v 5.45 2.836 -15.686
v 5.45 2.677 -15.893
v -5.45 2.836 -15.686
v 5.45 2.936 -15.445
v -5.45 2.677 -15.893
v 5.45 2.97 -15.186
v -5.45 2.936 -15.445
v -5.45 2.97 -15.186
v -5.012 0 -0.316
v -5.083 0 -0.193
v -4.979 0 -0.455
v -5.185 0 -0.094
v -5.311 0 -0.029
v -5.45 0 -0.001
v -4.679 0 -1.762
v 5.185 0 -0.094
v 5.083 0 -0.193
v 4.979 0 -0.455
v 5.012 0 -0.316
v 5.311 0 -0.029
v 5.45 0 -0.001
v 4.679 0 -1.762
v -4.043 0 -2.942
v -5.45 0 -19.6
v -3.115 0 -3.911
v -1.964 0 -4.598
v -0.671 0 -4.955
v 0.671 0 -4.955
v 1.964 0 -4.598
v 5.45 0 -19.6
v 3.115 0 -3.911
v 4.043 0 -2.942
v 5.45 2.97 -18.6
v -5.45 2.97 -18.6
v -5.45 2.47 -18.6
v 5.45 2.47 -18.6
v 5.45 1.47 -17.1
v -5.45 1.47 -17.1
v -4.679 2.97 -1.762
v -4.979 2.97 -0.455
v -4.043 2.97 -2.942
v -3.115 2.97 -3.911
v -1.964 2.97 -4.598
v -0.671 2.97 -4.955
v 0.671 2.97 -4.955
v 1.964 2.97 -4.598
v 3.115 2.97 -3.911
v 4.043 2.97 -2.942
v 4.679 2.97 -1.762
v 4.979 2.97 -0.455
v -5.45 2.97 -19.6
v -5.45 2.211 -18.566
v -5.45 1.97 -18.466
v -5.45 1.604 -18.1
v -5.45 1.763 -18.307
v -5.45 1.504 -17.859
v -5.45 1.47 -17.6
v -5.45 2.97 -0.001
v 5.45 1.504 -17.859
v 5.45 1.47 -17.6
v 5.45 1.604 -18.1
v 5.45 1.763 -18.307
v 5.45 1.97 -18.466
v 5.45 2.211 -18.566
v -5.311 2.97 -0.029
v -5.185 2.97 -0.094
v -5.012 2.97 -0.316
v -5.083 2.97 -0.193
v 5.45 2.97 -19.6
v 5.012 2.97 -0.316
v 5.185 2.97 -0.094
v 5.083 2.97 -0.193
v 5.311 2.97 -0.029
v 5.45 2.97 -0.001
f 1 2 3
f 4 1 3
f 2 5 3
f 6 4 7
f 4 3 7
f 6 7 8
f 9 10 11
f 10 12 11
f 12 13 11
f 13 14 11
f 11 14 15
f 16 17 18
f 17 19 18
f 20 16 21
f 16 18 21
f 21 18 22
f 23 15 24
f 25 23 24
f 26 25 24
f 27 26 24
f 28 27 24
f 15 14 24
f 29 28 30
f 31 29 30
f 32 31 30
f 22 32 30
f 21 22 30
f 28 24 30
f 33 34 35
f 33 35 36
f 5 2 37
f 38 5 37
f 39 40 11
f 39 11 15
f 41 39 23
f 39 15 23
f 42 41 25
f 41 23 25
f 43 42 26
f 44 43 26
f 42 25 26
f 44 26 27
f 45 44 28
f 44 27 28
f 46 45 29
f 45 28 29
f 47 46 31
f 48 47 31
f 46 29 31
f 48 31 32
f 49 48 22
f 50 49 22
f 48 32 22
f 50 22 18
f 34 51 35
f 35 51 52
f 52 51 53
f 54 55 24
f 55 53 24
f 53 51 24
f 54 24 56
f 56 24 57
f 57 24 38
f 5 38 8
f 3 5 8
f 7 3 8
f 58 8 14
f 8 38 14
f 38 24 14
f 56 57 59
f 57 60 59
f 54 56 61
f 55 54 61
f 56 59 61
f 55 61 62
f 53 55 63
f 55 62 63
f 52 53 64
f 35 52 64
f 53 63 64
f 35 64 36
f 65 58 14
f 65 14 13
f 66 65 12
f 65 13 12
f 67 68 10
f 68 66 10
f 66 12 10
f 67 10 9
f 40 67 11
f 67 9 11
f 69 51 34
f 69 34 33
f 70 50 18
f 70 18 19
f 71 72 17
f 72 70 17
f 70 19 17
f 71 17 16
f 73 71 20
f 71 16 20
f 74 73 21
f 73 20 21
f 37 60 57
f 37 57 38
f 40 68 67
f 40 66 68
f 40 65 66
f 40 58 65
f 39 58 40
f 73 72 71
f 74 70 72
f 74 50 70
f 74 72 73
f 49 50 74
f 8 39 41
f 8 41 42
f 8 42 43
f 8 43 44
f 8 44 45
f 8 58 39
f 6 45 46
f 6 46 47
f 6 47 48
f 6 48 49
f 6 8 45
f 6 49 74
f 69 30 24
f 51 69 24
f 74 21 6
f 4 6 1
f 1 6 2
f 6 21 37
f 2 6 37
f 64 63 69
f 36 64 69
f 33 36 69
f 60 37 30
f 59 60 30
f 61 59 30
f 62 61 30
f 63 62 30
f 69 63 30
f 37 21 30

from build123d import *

# Parameters (mm, degrees)
BOSS_EXTRUDE1_DEPTH = 2.97
FILLET1_R           = 0.5
SKETCH2_W           = 10.9
SKETCH2_H           = 1
CUT_EXTRUDE1_DEPTH  = 1.5
CHAMFER1_SIZE       = 2
FILLET2_R           = 1


with BuildPart() as part:
    # Sketch1 → Boss-Extrude1 (new body)
    with BuildSketch(Plane(origin=(0, 0, 0), x_dir=(1, 0, 0), z_dir=(0, 1, 0))):
        with BuildLine():
            Line((5, 0), (5.45, 0))
            Line((5.45, 0), (5.45, 19.6))
            Line((5.45, 19.6), (-5.45, 19.6))
            Line((-5.45, 19.6), (-5.45, 0))
            Line((-5.45, 0), (-5, 0))
            ThreePointArc((-5, 0), (0, 5), (5, 0))
        make_face()
    extrude(amount=BOSS_EXTRUDE1_DEPTH)

    # Fillet1
    # the kernel refuses this fillet: 0.5 mm, written as the material it takes off along each edge
    with BuildSketch(Plane(origin=(5, -1.193063938, 0), x_dir=(1, 0, 0), z_dir=(0, 1, 0))) as fillet1_piece_1:
        with BuildLine():
            CenterArc((0.477225575, 0.5), FILLET1_R, 185.21590857, 84.78409143)
            ThreePointArc((-0.020704023, 0.454545455), (-0.005178688, 0.227508366), (0, 0))
            Line((0, 0), (0.477225575, 0))
        make_face()
    extrude(amount=5.356127875, mode=Mode.SUBTRACT)
    with BuildSketch(Plane(origin=(-5, -1.193063938, 0), x_dir=(-1, 0, 0), z_dir=(0, 1, 0))) as fillet1_piece_2:
        with BuildLine():
            CenterArc((0.477225575, -0.5), FILLET1_R, 90, 84.78409143)
            ThreePointArc((-0.020704023, -0.454545455), (-0.005178688, -0.227508366), (0, 0))
            Line((0, 0), (0.477225575, 0))
        make_face()
    extrude(amount=5.356127875, mode=Mode.SUBTRACT)

    # Sketch2 → Cut-Extrude1 (cut)
    with BuildSketch(Plane(origin=(0, 2.97, 0), x_dir=(1, 0, 0), z_dir=(0, 1, 0))):
        with Locations((0, 18.1)):
            Rectangle(SKETCH2_W, SKETCH2_H)
    extrude(amount=-CUT_EXTRUDE1_DEPTH, mode=Mode.SUBTRACT)

    # Chamfer1
    # the kernel refuses this chamfer: 2 mm, written as the material it takes off along each edge
    with BuildSketch(Plane(origin=(10.593365976, 2.97, -17.6), x_dir=(0, 0.02749587661058627, 0.9996219169112968), z_dir=(-1, 0, 0))) as chamfer1_piece_1_section:
        Polygon((CHAMFER1_SIZE * 0.999621916911, -CHAMFER1_SIZE * 0.0274958766106), (-CHAMFER1_SIZE * 0.0274958766106, -CHAMFER1_SIZE * 0.999621916911), (0, 0), align=None)
    chamfer1_piece_1 = extrude(amount=21.186731952, mode=Mode.PRIVATE)
    chamfer1_piece_1 = split(chamfer1_piece_1, bisect_by=Plane(origin=(0, 1.47, -16.89608178), z_dir=(0, 1, 0)), keep=Keep.TOP, mode=Mode.PRIVATE)
    add(chamfer1_piece_1, mode=Mode.SUBTRACT)

    # Fillet2
    fillet2_edges = [part.edges().sort_by_distance(p)[0] for p in [
        (0, 1.47, -18.6),
        (0, 2.97, -15.6),
    ]]
    fillet(fillet2_edges, radius=FILLET2_R)


solid = part.part
